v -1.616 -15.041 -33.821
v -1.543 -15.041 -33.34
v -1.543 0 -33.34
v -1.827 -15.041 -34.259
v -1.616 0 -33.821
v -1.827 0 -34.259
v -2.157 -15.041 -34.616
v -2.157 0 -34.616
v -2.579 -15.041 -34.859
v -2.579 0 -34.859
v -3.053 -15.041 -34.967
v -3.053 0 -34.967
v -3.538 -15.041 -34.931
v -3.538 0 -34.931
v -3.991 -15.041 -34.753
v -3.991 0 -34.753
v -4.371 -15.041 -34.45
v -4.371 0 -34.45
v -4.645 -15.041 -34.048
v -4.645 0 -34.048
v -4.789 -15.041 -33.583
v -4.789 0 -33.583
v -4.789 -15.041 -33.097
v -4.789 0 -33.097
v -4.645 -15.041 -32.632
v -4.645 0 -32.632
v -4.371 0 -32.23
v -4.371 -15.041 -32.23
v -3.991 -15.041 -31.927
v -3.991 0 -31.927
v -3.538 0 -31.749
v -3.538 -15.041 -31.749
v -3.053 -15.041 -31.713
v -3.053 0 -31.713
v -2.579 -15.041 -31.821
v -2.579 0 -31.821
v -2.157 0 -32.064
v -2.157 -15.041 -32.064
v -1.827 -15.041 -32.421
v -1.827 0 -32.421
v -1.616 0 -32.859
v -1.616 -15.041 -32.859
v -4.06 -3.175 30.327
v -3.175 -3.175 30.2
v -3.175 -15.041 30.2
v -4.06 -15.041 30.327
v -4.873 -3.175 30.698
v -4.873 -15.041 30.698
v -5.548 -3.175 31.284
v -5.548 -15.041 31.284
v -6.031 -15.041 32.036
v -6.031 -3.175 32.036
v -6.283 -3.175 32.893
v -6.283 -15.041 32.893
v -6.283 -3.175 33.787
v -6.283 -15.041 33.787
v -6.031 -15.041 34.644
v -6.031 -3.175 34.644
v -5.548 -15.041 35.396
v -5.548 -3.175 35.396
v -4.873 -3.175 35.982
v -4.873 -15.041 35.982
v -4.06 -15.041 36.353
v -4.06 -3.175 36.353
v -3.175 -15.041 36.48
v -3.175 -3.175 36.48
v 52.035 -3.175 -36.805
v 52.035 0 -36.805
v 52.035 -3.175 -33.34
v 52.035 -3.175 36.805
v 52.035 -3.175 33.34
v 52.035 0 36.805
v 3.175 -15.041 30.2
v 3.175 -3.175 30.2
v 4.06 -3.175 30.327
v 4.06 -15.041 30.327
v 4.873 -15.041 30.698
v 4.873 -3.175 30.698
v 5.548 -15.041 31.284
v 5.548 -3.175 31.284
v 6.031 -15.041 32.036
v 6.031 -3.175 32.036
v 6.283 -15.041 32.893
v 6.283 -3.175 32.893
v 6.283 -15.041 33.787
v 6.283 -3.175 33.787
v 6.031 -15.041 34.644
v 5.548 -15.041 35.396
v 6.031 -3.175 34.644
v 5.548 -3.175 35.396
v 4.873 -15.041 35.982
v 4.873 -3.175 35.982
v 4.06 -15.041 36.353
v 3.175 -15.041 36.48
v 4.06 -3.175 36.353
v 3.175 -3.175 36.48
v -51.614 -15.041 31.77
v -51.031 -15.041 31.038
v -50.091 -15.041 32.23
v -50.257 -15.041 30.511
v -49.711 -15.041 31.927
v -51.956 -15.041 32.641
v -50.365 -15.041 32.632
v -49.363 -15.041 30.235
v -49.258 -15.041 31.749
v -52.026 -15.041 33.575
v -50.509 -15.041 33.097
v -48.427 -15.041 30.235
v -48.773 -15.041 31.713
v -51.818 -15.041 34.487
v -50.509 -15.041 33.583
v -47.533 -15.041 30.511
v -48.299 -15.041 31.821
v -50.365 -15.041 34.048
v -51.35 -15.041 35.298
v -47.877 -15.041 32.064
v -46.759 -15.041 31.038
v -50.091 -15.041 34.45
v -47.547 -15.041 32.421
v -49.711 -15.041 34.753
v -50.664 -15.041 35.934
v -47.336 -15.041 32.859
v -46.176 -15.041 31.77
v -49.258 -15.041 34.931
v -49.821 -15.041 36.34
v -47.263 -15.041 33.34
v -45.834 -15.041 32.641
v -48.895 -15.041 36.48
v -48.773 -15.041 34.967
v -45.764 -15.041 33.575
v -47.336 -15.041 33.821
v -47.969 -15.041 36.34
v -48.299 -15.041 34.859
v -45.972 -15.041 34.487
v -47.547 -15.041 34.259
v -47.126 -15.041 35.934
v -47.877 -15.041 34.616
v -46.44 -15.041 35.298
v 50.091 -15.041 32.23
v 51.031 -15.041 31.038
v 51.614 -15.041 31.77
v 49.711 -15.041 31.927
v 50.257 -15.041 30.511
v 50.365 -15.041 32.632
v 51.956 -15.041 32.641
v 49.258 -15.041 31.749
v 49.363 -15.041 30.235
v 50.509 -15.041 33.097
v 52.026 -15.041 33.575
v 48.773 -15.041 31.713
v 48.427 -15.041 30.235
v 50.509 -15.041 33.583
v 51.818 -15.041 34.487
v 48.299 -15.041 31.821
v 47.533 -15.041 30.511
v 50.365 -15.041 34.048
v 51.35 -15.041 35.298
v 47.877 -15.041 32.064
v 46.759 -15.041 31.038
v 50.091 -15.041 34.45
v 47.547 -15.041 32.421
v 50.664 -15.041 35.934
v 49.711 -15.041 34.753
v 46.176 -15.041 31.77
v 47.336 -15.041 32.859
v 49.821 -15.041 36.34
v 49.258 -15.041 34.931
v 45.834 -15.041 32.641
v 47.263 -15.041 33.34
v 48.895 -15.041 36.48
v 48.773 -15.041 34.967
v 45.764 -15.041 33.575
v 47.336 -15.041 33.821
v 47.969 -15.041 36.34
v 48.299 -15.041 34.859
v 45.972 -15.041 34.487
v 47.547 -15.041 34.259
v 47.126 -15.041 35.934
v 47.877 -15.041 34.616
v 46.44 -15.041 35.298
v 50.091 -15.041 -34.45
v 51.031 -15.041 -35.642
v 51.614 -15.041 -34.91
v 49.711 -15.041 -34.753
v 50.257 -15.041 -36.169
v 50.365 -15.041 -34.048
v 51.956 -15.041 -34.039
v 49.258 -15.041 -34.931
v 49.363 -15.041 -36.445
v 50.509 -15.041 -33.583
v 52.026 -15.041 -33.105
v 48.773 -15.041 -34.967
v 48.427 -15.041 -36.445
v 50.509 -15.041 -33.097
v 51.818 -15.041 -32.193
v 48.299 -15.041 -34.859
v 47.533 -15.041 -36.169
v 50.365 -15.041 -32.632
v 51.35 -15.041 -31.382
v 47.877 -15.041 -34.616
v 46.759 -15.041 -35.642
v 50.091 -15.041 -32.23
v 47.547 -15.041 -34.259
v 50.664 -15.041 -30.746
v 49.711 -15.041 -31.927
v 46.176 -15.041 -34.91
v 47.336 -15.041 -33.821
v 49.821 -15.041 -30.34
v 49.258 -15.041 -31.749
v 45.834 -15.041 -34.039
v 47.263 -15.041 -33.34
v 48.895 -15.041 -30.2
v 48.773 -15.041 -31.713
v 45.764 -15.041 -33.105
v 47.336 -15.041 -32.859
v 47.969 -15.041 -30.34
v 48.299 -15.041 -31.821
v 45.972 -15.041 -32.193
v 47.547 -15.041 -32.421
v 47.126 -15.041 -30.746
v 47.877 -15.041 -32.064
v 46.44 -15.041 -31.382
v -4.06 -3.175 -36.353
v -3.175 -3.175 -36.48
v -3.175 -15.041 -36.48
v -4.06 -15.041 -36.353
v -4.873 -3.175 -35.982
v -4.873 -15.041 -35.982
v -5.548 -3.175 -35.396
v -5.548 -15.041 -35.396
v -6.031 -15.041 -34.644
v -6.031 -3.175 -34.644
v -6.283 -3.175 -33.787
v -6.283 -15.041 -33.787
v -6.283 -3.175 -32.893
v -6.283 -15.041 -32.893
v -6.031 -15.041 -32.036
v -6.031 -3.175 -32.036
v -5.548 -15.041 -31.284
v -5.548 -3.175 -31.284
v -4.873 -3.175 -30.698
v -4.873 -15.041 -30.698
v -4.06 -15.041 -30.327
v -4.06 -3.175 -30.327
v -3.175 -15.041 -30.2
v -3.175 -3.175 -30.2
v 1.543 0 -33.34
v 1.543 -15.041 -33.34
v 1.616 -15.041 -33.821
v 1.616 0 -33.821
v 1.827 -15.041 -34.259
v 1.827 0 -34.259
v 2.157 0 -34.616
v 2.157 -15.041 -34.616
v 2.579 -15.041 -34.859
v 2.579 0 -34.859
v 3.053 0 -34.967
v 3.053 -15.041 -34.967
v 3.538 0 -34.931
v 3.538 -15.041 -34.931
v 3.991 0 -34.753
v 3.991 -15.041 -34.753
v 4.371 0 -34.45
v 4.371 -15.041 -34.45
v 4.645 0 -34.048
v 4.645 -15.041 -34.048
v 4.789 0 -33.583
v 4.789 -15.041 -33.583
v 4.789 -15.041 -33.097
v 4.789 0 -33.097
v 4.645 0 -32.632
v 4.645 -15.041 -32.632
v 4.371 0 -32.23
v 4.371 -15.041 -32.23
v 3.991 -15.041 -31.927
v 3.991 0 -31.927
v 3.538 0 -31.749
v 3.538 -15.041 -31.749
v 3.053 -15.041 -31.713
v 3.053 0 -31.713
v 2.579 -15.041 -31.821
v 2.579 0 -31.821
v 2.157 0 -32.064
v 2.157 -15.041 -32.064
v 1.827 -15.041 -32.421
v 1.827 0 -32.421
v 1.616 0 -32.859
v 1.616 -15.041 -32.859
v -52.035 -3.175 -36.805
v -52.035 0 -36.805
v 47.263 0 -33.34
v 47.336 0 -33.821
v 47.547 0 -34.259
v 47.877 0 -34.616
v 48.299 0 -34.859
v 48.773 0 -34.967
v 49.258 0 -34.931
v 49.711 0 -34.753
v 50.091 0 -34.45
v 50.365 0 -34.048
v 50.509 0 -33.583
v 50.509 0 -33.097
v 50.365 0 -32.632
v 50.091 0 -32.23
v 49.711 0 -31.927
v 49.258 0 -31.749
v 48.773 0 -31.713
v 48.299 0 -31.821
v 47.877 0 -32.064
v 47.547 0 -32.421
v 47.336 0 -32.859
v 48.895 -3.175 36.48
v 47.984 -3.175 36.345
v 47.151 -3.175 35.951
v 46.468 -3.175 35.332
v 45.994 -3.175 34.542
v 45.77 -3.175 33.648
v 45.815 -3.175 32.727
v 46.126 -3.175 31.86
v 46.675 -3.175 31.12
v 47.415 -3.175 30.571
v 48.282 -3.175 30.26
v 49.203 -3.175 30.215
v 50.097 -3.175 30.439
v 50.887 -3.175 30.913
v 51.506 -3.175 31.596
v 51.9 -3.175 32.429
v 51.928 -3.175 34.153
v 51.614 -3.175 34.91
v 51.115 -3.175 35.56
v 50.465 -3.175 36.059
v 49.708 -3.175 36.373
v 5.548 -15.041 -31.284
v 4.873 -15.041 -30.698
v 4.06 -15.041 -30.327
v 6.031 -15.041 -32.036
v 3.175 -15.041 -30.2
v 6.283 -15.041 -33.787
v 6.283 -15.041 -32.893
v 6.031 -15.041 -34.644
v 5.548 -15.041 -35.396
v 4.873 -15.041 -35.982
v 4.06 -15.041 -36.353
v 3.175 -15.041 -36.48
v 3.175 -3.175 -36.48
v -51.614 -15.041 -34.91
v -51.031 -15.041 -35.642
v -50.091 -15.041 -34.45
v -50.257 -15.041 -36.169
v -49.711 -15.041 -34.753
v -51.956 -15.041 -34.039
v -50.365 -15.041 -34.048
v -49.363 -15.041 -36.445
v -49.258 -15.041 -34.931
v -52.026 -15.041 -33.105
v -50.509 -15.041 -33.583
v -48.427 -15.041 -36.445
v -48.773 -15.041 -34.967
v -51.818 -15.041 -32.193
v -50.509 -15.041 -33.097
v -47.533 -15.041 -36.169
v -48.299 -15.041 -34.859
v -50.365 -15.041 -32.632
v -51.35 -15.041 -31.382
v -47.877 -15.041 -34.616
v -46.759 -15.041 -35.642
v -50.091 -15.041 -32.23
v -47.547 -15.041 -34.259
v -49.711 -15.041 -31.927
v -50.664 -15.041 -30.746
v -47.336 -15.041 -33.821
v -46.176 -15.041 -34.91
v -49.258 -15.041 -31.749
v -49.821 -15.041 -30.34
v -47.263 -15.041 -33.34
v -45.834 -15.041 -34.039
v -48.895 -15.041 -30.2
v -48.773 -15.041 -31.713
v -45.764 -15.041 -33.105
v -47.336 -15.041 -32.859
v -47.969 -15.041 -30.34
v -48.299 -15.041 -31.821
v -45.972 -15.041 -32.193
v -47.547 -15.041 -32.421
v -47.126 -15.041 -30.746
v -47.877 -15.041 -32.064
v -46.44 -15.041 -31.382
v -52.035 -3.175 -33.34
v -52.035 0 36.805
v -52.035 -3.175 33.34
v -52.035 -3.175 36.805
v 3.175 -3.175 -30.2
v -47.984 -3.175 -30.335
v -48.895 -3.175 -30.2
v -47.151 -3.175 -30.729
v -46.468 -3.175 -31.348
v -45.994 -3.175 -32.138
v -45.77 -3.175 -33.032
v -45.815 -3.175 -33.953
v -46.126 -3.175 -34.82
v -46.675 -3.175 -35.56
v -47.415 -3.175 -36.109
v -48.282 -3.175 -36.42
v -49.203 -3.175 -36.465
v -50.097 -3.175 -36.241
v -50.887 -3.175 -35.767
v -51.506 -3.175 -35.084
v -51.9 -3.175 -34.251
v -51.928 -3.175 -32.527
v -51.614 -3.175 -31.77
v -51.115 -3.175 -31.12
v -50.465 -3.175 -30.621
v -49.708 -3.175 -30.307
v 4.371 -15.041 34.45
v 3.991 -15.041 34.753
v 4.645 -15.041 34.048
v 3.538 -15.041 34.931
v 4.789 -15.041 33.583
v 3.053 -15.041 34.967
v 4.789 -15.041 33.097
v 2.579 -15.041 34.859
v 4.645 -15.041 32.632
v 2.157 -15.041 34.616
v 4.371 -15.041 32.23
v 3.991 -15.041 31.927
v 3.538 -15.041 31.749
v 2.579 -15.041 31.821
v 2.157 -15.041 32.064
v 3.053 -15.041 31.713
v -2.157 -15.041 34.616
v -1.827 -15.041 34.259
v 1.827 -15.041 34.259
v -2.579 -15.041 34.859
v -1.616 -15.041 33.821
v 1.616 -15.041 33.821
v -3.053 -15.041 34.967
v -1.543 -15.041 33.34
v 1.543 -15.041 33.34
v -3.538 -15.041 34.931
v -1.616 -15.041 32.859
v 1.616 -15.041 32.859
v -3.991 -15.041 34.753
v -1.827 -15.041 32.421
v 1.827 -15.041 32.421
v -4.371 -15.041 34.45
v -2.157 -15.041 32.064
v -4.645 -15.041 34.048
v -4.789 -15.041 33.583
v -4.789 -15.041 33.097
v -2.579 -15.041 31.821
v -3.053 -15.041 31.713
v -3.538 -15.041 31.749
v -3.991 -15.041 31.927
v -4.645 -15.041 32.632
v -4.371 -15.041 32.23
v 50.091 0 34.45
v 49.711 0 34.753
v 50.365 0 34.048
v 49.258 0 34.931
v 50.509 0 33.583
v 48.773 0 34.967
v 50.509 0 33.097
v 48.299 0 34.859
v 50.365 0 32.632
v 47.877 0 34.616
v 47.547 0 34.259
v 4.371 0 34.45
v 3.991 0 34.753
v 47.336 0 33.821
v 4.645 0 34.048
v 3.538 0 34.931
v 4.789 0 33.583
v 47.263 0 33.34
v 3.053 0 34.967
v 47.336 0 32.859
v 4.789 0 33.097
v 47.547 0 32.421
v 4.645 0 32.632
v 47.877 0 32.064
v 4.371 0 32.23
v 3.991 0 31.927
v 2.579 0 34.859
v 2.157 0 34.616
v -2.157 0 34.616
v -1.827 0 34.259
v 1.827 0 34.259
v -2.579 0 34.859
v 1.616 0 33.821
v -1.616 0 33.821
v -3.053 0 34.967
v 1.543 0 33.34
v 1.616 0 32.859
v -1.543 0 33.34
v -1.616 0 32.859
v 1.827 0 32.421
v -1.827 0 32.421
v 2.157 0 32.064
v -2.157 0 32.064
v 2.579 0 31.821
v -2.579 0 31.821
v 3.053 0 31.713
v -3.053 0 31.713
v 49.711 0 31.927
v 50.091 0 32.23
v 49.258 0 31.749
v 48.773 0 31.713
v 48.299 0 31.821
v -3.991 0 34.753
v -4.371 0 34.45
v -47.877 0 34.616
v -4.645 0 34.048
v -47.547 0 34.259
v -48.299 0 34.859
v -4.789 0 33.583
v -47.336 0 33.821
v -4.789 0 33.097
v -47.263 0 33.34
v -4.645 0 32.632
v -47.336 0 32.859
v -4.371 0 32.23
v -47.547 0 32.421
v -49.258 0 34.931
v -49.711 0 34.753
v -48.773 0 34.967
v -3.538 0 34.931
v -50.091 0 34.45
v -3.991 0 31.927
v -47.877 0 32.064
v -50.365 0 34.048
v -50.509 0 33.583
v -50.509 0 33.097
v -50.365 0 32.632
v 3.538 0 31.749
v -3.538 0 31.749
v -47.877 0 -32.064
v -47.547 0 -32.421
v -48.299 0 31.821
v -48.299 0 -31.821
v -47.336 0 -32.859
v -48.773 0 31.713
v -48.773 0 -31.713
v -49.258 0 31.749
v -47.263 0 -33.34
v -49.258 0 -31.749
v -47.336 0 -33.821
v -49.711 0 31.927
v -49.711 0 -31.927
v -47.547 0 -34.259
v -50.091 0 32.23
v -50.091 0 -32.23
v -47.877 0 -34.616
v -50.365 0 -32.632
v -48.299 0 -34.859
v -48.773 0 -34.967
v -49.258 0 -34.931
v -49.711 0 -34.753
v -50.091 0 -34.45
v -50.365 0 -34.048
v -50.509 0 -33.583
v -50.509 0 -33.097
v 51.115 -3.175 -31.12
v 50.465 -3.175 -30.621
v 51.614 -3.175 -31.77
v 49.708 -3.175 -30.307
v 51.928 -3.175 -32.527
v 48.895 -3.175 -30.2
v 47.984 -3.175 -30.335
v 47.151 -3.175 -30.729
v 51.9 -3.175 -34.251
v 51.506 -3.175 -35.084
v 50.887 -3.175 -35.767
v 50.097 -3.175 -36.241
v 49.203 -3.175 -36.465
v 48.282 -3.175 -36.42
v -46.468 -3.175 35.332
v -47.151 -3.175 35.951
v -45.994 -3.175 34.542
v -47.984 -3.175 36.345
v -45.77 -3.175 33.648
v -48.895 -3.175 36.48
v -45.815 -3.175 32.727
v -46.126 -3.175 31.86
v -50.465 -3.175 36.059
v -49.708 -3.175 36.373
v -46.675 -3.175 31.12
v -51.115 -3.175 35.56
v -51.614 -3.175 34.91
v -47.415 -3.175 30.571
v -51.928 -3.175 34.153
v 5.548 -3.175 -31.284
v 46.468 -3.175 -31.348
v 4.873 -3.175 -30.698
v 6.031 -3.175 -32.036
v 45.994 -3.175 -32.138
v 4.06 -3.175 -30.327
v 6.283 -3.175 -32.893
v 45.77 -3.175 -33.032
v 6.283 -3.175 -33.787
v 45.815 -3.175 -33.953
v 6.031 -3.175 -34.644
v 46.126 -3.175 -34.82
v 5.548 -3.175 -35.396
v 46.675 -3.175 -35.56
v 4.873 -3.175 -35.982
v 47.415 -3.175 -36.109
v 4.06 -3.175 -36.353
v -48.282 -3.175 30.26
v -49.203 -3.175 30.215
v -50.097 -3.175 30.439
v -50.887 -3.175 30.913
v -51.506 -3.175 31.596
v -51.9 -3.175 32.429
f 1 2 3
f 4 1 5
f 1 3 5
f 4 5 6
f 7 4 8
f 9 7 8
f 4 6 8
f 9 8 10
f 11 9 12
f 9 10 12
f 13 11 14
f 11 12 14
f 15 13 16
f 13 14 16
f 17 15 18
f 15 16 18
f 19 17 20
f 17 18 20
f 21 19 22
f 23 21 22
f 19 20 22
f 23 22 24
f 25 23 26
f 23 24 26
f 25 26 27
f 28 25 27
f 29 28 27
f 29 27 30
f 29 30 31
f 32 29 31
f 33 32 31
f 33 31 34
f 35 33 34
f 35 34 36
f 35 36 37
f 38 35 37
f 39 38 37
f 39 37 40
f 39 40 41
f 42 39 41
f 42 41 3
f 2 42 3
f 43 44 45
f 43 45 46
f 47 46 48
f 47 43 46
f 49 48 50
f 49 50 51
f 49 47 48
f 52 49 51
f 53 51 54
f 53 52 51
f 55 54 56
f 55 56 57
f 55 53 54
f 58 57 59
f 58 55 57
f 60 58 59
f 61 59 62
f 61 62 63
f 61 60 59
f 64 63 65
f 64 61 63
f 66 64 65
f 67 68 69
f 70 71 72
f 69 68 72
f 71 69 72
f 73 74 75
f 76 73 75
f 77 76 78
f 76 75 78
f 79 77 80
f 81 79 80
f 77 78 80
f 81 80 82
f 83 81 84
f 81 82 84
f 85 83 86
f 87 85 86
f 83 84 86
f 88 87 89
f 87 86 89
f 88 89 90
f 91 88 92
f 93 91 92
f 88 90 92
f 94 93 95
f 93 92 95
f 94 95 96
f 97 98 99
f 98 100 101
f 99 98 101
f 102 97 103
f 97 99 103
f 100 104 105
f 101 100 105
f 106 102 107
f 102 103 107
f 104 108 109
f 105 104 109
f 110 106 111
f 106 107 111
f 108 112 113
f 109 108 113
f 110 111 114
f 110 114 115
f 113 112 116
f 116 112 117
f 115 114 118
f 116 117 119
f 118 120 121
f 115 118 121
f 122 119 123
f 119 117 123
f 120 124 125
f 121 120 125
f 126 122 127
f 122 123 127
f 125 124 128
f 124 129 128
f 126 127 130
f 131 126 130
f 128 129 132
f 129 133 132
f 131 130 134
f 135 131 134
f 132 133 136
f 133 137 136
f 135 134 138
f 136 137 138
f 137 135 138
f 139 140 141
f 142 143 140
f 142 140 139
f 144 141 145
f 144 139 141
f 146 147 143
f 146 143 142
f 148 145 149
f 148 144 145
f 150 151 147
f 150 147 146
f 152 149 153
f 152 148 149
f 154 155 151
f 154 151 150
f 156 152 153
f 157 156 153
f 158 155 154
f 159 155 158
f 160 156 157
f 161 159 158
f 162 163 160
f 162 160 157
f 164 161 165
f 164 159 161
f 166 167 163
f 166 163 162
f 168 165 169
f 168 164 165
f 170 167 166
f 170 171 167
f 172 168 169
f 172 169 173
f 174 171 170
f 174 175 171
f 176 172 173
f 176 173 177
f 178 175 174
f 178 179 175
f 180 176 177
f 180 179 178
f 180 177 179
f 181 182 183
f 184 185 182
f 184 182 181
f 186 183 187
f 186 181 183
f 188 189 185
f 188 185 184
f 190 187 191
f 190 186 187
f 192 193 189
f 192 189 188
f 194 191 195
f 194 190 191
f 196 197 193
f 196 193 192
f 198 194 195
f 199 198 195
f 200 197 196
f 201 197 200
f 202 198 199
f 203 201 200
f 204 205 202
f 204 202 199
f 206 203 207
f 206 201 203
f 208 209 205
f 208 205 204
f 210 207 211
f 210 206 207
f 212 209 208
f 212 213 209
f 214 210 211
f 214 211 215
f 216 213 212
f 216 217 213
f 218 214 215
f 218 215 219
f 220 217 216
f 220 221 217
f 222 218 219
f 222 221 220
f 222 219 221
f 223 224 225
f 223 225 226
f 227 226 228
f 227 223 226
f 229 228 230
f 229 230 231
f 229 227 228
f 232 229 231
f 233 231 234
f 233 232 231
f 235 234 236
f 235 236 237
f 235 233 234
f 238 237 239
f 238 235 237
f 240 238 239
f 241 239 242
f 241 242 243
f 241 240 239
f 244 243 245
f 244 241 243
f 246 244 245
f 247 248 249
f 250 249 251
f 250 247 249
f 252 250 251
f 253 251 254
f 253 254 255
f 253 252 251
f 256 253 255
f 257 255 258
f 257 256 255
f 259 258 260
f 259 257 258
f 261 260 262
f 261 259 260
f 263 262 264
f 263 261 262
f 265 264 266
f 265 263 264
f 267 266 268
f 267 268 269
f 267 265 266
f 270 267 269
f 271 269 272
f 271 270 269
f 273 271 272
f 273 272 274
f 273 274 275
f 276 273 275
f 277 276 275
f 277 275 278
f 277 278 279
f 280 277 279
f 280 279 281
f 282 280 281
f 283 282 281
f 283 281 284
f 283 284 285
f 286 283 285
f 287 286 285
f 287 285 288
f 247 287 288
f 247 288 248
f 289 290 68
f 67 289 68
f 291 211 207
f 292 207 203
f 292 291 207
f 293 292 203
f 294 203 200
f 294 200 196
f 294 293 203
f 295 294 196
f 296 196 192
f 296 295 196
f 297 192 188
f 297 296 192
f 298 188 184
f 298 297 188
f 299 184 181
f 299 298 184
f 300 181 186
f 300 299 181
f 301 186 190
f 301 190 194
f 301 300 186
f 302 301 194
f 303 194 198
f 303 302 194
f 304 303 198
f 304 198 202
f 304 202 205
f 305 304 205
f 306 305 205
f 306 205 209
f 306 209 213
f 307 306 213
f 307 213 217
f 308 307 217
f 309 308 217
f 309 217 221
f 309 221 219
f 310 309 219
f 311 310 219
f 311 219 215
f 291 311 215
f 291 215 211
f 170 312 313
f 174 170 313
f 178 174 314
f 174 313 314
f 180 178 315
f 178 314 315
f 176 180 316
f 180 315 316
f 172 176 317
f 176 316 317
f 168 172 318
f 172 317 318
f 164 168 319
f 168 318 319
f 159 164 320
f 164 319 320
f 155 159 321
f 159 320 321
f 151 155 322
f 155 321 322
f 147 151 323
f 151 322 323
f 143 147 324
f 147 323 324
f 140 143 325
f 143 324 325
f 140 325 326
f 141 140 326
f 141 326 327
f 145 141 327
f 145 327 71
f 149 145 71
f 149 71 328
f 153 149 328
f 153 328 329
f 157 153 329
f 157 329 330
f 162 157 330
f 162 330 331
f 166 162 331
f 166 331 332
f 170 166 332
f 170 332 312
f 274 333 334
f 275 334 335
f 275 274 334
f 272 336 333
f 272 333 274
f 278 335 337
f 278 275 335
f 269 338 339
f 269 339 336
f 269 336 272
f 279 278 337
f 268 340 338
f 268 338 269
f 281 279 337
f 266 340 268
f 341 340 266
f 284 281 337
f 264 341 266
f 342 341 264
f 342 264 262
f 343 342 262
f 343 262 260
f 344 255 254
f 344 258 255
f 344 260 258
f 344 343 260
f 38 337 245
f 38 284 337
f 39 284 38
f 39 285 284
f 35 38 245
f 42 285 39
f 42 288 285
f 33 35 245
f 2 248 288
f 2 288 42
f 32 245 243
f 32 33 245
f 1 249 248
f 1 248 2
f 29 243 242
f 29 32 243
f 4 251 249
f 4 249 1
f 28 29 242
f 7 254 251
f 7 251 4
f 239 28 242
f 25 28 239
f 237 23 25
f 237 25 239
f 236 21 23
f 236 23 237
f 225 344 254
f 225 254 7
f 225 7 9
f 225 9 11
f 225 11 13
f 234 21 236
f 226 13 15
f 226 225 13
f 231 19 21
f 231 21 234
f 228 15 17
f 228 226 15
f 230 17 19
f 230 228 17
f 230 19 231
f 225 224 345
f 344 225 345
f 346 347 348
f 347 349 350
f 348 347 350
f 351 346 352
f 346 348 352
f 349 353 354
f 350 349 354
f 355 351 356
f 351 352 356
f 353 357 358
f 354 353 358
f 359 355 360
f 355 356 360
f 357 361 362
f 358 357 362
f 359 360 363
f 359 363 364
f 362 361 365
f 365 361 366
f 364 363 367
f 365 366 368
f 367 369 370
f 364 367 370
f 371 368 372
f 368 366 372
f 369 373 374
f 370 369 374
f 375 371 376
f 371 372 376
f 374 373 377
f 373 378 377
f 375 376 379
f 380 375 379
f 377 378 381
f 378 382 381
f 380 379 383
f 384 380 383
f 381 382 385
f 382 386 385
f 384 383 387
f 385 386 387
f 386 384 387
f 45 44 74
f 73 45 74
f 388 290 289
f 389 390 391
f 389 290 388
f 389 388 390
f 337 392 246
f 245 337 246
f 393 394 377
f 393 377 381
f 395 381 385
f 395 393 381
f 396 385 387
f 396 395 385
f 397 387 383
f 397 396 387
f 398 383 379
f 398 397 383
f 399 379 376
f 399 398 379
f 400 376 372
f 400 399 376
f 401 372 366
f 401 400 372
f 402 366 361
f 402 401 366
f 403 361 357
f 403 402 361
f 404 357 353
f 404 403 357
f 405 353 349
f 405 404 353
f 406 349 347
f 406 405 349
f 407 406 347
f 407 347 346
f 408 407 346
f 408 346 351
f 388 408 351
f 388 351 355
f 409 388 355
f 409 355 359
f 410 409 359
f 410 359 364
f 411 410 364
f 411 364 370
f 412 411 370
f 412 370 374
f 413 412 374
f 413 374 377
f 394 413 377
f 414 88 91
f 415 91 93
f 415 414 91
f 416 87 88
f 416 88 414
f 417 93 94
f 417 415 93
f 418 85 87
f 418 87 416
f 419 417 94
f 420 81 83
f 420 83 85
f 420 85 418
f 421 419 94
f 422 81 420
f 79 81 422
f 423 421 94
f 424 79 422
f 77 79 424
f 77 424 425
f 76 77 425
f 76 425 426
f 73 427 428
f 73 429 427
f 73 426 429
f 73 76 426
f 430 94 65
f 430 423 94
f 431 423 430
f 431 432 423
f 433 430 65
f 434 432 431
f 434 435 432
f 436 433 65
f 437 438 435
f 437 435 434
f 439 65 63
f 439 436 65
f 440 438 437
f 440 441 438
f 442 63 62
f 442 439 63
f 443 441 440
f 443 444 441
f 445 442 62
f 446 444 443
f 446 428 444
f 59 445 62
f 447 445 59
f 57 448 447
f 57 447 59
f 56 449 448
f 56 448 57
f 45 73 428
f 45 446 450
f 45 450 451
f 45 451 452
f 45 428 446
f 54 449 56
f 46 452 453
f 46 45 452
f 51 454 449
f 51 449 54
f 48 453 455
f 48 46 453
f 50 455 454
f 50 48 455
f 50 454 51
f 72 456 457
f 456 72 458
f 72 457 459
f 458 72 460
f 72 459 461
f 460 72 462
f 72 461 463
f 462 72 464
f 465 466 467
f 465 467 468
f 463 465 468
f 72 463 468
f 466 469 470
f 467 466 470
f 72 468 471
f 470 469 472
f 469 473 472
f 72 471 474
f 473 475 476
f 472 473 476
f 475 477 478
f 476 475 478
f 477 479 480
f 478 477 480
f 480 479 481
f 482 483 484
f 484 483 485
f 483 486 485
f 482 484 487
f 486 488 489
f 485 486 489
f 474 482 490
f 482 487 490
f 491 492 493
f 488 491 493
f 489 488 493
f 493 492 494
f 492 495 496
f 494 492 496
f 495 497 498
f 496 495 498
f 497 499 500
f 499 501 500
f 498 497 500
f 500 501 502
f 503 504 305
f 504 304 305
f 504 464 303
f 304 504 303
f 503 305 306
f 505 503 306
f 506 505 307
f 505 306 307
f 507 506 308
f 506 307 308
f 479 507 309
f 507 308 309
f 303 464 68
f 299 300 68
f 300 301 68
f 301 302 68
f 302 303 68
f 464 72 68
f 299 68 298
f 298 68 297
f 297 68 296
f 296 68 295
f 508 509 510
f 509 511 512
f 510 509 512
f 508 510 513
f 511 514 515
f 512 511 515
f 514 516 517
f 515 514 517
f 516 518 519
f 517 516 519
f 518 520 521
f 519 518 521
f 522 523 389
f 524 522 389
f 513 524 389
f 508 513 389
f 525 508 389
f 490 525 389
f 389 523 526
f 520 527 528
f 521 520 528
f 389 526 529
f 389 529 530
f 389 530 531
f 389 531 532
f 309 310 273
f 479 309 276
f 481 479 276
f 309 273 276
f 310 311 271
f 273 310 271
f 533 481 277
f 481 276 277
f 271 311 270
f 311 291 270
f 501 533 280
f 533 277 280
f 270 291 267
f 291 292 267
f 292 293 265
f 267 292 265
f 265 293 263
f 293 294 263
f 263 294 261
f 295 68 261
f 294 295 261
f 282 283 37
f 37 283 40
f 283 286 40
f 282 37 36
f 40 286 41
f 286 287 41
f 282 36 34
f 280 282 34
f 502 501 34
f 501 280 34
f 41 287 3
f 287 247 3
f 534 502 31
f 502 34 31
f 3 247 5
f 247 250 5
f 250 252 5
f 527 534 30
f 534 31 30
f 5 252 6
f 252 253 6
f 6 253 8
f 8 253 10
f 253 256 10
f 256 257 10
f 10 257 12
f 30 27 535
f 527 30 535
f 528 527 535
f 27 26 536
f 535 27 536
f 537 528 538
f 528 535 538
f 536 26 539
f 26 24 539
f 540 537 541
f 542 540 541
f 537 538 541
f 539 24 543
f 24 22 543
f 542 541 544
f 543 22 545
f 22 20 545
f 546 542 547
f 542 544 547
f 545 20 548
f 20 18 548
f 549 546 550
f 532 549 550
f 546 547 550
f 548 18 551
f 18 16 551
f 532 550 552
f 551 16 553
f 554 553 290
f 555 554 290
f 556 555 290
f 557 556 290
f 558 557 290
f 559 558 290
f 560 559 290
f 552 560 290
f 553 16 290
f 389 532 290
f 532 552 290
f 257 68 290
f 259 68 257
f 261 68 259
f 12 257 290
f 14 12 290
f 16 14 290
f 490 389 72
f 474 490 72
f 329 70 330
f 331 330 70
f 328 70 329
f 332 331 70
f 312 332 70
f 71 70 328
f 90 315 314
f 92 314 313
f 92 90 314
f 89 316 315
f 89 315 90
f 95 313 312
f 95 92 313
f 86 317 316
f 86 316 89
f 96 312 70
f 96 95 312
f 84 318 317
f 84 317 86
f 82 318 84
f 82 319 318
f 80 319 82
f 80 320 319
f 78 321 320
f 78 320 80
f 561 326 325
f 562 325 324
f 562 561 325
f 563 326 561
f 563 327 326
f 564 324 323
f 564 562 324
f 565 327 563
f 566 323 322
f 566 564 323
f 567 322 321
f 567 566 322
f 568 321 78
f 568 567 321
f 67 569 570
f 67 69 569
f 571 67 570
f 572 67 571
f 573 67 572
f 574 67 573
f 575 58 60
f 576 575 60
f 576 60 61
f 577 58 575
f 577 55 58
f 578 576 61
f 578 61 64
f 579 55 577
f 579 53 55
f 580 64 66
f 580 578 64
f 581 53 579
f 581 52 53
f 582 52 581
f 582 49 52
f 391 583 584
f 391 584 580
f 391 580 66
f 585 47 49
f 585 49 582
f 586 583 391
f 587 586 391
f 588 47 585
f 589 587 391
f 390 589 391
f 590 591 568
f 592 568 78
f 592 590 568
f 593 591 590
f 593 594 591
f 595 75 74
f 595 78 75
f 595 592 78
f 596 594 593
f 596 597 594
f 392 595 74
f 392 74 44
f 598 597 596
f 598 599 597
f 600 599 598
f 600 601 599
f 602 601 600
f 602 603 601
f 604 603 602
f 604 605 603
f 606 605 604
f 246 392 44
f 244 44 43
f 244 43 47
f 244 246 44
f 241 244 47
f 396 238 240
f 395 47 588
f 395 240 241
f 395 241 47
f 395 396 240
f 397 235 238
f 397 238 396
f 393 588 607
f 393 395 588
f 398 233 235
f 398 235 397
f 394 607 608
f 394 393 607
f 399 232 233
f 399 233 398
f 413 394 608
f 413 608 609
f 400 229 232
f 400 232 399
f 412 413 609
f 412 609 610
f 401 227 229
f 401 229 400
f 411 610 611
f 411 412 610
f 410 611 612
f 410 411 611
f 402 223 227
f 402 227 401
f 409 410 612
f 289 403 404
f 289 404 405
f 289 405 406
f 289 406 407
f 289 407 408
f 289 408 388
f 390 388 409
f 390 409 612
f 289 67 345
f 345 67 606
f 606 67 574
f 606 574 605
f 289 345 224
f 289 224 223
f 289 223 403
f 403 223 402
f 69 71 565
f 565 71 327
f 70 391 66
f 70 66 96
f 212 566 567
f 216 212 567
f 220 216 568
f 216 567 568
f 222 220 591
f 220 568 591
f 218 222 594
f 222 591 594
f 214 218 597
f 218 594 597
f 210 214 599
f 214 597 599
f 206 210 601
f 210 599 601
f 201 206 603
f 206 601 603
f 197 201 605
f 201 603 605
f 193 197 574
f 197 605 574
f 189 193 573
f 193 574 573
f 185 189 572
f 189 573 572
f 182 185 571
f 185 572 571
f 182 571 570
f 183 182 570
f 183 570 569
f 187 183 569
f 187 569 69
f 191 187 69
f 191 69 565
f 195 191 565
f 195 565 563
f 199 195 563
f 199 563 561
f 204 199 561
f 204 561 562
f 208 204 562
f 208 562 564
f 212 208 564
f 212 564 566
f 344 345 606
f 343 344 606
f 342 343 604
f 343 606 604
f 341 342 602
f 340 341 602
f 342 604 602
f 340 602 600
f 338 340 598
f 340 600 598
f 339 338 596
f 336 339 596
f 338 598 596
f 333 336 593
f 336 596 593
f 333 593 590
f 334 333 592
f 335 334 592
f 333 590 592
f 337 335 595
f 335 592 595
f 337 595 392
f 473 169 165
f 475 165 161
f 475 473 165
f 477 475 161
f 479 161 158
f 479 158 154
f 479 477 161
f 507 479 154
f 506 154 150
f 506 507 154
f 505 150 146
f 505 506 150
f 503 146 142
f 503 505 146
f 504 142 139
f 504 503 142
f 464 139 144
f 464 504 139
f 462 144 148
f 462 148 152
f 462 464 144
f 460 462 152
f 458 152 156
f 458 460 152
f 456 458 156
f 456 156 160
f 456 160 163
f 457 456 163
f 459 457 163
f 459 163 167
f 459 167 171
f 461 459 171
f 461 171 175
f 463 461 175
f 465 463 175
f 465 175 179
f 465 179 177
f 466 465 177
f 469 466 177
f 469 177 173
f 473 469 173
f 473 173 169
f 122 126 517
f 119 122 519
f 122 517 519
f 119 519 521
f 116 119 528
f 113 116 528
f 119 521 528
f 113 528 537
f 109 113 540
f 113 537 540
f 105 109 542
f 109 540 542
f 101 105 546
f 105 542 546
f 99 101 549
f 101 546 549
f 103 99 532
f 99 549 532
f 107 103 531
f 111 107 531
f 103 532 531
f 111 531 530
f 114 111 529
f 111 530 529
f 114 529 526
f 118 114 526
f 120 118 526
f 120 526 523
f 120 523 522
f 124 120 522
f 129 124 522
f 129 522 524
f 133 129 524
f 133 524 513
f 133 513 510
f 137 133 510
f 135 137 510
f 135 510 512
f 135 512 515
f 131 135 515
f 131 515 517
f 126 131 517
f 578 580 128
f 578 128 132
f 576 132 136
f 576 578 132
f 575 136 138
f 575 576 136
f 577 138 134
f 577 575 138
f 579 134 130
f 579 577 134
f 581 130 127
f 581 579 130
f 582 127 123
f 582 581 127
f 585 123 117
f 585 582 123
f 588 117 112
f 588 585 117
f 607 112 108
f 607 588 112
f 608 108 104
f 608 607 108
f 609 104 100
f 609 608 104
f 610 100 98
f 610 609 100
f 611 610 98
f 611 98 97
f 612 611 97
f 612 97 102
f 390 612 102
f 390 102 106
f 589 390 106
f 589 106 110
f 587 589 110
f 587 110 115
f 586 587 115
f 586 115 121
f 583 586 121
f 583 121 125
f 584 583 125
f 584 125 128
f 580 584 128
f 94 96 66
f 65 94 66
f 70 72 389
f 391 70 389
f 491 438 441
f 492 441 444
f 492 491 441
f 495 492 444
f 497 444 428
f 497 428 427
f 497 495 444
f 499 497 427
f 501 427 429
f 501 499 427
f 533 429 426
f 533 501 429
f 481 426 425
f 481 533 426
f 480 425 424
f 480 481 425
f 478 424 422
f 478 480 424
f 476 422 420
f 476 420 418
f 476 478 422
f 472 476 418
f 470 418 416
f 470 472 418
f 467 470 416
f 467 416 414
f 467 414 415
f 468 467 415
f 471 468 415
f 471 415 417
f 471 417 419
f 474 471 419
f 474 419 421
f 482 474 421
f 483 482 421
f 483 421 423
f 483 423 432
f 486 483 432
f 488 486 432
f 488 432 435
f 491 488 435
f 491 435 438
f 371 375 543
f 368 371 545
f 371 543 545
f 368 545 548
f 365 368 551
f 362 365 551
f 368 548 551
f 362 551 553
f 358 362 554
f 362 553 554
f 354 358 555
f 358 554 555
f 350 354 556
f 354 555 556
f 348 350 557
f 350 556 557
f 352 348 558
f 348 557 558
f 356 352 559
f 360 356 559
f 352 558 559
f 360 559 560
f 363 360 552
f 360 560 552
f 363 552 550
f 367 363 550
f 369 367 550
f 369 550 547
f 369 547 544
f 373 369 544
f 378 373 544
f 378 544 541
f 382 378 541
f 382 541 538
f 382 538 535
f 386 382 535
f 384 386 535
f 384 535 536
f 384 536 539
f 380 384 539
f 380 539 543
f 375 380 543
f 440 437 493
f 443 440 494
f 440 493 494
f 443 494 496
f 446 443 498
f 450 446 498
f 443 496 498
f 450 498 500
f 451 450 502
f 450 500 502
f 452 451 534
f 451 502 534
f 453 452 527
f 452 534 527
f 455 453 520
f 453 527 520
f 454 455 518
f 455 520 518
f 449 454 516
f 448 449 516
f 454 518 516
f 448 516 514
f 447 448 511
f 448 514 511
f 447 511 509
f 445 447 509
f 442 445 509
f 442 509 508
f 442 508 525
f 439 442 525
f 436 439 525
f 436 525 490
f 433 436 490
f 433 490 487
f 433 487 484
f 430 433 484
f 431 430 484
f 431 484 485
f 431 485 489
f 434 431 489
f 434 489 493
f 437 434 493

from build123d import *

# Parameters (mm, degrees)
BOSS_EXTRUDE1_DEPTH       = 3.175
SKETCH2_R                 = 3.14
BOSS_EXTRUDE2_DEPTH       = 15.04125
F_4_CLEARANCE_HOLE1_D     = 3.2639
F_4_CLEARANCE_HOLE1_DEPTH = 25.4
F_4_CLEARANCE_HOLE1_TIP   = 0.980574487


with BuildPart() as part:
    # Sketch1 → Boss-Extrude1 (new body)
    with BuildSketch(Plane(origin=(0, 0, 0), x_dir=(1, 0, 0), z_dir=(0, 1, 0))):
        Polygon((0, 36.805), (-0.035, 36.805), (-52.035, 36.805), (-52.035, -36.805), (-0.035, -36.805), (0, -36.805), align=None)
    extrude(amount=-BOSS_EXTRUDE1_DEPTH)

    # Sketch2 → Boss-Extrude2 (add)
    with BuildSketch(Plane(origin=(0, 0, 0), x_dir=(1, 0, 0), z_dir=(0, 1, 0))):
        with BuildLine():
            Line((-3.175, 30.2), (0, 30.2))
            Line((0, 30.2), (0, 36.48))
            Line((0, 36.48), (-3.175, 36.48))
            ThreePointArc((-3.175, 36.48), (-6.315, 33.34), (-3.175, 30.2))
        make_face()
        with BuildLine():
            Line((-3.175, -36.48), (0, -36.48))
            Line((0, -36.48), (0, -30.2))
            Line((0, -30.2), (-3.175, -30.2))
            ThreePointArc((-3.175, -30.2), (-6.315, -33.34), (-3.175, -36.48))
        make_face()
        with Locations(Location((-48.895, 33.34, 0), (0, 0, 270))):
            Circle(SKETCH2_R)
        with Locations(Location((-48.895, -33.34, 0), (0, 0, 270))):
            Circle(SKETCH2_R)
    extrude(amount=-BOSS_EXTRUDE2_DEPTH)

    # #4 Clearance Hole1
    with Locations(Plane(origin=(0, -15.04125, 0), x_dir=(-1, 0, 0), z_dir=(0, -1, 0))):
        with Locations((48.895, 33.34), (3.175, 33.34), (3.175, -33.34), (48.895, -33.34)):
            Hole(F_4_CLEARANCE_HOLE1_D / 2, depth=F_4_CLEARANCE_HOLE1_DEPTH)
            with Locations((0, 0, -(F_4_CLEARANCE_HOLE1_DEPTH + F_4_CLEARANCE_HOLE1_TIP / 2))):  # 118° drill point
                Cone(0, F_4_CLEARANCE_HOLE1_D / 2, F_4_CLEARANCE_HOLE1_TIP, mode=Mode.SUBTRACT)

    # Mirror1: part across plane


with BuildPart() as part_1:
    add(part.part)
    add(part.part.mirror(Plane(origin=(0, -3.175, 0), x_dir=(0, 0, 1), z_dir=(-1, 0, 0))))


solid = part_1.part
